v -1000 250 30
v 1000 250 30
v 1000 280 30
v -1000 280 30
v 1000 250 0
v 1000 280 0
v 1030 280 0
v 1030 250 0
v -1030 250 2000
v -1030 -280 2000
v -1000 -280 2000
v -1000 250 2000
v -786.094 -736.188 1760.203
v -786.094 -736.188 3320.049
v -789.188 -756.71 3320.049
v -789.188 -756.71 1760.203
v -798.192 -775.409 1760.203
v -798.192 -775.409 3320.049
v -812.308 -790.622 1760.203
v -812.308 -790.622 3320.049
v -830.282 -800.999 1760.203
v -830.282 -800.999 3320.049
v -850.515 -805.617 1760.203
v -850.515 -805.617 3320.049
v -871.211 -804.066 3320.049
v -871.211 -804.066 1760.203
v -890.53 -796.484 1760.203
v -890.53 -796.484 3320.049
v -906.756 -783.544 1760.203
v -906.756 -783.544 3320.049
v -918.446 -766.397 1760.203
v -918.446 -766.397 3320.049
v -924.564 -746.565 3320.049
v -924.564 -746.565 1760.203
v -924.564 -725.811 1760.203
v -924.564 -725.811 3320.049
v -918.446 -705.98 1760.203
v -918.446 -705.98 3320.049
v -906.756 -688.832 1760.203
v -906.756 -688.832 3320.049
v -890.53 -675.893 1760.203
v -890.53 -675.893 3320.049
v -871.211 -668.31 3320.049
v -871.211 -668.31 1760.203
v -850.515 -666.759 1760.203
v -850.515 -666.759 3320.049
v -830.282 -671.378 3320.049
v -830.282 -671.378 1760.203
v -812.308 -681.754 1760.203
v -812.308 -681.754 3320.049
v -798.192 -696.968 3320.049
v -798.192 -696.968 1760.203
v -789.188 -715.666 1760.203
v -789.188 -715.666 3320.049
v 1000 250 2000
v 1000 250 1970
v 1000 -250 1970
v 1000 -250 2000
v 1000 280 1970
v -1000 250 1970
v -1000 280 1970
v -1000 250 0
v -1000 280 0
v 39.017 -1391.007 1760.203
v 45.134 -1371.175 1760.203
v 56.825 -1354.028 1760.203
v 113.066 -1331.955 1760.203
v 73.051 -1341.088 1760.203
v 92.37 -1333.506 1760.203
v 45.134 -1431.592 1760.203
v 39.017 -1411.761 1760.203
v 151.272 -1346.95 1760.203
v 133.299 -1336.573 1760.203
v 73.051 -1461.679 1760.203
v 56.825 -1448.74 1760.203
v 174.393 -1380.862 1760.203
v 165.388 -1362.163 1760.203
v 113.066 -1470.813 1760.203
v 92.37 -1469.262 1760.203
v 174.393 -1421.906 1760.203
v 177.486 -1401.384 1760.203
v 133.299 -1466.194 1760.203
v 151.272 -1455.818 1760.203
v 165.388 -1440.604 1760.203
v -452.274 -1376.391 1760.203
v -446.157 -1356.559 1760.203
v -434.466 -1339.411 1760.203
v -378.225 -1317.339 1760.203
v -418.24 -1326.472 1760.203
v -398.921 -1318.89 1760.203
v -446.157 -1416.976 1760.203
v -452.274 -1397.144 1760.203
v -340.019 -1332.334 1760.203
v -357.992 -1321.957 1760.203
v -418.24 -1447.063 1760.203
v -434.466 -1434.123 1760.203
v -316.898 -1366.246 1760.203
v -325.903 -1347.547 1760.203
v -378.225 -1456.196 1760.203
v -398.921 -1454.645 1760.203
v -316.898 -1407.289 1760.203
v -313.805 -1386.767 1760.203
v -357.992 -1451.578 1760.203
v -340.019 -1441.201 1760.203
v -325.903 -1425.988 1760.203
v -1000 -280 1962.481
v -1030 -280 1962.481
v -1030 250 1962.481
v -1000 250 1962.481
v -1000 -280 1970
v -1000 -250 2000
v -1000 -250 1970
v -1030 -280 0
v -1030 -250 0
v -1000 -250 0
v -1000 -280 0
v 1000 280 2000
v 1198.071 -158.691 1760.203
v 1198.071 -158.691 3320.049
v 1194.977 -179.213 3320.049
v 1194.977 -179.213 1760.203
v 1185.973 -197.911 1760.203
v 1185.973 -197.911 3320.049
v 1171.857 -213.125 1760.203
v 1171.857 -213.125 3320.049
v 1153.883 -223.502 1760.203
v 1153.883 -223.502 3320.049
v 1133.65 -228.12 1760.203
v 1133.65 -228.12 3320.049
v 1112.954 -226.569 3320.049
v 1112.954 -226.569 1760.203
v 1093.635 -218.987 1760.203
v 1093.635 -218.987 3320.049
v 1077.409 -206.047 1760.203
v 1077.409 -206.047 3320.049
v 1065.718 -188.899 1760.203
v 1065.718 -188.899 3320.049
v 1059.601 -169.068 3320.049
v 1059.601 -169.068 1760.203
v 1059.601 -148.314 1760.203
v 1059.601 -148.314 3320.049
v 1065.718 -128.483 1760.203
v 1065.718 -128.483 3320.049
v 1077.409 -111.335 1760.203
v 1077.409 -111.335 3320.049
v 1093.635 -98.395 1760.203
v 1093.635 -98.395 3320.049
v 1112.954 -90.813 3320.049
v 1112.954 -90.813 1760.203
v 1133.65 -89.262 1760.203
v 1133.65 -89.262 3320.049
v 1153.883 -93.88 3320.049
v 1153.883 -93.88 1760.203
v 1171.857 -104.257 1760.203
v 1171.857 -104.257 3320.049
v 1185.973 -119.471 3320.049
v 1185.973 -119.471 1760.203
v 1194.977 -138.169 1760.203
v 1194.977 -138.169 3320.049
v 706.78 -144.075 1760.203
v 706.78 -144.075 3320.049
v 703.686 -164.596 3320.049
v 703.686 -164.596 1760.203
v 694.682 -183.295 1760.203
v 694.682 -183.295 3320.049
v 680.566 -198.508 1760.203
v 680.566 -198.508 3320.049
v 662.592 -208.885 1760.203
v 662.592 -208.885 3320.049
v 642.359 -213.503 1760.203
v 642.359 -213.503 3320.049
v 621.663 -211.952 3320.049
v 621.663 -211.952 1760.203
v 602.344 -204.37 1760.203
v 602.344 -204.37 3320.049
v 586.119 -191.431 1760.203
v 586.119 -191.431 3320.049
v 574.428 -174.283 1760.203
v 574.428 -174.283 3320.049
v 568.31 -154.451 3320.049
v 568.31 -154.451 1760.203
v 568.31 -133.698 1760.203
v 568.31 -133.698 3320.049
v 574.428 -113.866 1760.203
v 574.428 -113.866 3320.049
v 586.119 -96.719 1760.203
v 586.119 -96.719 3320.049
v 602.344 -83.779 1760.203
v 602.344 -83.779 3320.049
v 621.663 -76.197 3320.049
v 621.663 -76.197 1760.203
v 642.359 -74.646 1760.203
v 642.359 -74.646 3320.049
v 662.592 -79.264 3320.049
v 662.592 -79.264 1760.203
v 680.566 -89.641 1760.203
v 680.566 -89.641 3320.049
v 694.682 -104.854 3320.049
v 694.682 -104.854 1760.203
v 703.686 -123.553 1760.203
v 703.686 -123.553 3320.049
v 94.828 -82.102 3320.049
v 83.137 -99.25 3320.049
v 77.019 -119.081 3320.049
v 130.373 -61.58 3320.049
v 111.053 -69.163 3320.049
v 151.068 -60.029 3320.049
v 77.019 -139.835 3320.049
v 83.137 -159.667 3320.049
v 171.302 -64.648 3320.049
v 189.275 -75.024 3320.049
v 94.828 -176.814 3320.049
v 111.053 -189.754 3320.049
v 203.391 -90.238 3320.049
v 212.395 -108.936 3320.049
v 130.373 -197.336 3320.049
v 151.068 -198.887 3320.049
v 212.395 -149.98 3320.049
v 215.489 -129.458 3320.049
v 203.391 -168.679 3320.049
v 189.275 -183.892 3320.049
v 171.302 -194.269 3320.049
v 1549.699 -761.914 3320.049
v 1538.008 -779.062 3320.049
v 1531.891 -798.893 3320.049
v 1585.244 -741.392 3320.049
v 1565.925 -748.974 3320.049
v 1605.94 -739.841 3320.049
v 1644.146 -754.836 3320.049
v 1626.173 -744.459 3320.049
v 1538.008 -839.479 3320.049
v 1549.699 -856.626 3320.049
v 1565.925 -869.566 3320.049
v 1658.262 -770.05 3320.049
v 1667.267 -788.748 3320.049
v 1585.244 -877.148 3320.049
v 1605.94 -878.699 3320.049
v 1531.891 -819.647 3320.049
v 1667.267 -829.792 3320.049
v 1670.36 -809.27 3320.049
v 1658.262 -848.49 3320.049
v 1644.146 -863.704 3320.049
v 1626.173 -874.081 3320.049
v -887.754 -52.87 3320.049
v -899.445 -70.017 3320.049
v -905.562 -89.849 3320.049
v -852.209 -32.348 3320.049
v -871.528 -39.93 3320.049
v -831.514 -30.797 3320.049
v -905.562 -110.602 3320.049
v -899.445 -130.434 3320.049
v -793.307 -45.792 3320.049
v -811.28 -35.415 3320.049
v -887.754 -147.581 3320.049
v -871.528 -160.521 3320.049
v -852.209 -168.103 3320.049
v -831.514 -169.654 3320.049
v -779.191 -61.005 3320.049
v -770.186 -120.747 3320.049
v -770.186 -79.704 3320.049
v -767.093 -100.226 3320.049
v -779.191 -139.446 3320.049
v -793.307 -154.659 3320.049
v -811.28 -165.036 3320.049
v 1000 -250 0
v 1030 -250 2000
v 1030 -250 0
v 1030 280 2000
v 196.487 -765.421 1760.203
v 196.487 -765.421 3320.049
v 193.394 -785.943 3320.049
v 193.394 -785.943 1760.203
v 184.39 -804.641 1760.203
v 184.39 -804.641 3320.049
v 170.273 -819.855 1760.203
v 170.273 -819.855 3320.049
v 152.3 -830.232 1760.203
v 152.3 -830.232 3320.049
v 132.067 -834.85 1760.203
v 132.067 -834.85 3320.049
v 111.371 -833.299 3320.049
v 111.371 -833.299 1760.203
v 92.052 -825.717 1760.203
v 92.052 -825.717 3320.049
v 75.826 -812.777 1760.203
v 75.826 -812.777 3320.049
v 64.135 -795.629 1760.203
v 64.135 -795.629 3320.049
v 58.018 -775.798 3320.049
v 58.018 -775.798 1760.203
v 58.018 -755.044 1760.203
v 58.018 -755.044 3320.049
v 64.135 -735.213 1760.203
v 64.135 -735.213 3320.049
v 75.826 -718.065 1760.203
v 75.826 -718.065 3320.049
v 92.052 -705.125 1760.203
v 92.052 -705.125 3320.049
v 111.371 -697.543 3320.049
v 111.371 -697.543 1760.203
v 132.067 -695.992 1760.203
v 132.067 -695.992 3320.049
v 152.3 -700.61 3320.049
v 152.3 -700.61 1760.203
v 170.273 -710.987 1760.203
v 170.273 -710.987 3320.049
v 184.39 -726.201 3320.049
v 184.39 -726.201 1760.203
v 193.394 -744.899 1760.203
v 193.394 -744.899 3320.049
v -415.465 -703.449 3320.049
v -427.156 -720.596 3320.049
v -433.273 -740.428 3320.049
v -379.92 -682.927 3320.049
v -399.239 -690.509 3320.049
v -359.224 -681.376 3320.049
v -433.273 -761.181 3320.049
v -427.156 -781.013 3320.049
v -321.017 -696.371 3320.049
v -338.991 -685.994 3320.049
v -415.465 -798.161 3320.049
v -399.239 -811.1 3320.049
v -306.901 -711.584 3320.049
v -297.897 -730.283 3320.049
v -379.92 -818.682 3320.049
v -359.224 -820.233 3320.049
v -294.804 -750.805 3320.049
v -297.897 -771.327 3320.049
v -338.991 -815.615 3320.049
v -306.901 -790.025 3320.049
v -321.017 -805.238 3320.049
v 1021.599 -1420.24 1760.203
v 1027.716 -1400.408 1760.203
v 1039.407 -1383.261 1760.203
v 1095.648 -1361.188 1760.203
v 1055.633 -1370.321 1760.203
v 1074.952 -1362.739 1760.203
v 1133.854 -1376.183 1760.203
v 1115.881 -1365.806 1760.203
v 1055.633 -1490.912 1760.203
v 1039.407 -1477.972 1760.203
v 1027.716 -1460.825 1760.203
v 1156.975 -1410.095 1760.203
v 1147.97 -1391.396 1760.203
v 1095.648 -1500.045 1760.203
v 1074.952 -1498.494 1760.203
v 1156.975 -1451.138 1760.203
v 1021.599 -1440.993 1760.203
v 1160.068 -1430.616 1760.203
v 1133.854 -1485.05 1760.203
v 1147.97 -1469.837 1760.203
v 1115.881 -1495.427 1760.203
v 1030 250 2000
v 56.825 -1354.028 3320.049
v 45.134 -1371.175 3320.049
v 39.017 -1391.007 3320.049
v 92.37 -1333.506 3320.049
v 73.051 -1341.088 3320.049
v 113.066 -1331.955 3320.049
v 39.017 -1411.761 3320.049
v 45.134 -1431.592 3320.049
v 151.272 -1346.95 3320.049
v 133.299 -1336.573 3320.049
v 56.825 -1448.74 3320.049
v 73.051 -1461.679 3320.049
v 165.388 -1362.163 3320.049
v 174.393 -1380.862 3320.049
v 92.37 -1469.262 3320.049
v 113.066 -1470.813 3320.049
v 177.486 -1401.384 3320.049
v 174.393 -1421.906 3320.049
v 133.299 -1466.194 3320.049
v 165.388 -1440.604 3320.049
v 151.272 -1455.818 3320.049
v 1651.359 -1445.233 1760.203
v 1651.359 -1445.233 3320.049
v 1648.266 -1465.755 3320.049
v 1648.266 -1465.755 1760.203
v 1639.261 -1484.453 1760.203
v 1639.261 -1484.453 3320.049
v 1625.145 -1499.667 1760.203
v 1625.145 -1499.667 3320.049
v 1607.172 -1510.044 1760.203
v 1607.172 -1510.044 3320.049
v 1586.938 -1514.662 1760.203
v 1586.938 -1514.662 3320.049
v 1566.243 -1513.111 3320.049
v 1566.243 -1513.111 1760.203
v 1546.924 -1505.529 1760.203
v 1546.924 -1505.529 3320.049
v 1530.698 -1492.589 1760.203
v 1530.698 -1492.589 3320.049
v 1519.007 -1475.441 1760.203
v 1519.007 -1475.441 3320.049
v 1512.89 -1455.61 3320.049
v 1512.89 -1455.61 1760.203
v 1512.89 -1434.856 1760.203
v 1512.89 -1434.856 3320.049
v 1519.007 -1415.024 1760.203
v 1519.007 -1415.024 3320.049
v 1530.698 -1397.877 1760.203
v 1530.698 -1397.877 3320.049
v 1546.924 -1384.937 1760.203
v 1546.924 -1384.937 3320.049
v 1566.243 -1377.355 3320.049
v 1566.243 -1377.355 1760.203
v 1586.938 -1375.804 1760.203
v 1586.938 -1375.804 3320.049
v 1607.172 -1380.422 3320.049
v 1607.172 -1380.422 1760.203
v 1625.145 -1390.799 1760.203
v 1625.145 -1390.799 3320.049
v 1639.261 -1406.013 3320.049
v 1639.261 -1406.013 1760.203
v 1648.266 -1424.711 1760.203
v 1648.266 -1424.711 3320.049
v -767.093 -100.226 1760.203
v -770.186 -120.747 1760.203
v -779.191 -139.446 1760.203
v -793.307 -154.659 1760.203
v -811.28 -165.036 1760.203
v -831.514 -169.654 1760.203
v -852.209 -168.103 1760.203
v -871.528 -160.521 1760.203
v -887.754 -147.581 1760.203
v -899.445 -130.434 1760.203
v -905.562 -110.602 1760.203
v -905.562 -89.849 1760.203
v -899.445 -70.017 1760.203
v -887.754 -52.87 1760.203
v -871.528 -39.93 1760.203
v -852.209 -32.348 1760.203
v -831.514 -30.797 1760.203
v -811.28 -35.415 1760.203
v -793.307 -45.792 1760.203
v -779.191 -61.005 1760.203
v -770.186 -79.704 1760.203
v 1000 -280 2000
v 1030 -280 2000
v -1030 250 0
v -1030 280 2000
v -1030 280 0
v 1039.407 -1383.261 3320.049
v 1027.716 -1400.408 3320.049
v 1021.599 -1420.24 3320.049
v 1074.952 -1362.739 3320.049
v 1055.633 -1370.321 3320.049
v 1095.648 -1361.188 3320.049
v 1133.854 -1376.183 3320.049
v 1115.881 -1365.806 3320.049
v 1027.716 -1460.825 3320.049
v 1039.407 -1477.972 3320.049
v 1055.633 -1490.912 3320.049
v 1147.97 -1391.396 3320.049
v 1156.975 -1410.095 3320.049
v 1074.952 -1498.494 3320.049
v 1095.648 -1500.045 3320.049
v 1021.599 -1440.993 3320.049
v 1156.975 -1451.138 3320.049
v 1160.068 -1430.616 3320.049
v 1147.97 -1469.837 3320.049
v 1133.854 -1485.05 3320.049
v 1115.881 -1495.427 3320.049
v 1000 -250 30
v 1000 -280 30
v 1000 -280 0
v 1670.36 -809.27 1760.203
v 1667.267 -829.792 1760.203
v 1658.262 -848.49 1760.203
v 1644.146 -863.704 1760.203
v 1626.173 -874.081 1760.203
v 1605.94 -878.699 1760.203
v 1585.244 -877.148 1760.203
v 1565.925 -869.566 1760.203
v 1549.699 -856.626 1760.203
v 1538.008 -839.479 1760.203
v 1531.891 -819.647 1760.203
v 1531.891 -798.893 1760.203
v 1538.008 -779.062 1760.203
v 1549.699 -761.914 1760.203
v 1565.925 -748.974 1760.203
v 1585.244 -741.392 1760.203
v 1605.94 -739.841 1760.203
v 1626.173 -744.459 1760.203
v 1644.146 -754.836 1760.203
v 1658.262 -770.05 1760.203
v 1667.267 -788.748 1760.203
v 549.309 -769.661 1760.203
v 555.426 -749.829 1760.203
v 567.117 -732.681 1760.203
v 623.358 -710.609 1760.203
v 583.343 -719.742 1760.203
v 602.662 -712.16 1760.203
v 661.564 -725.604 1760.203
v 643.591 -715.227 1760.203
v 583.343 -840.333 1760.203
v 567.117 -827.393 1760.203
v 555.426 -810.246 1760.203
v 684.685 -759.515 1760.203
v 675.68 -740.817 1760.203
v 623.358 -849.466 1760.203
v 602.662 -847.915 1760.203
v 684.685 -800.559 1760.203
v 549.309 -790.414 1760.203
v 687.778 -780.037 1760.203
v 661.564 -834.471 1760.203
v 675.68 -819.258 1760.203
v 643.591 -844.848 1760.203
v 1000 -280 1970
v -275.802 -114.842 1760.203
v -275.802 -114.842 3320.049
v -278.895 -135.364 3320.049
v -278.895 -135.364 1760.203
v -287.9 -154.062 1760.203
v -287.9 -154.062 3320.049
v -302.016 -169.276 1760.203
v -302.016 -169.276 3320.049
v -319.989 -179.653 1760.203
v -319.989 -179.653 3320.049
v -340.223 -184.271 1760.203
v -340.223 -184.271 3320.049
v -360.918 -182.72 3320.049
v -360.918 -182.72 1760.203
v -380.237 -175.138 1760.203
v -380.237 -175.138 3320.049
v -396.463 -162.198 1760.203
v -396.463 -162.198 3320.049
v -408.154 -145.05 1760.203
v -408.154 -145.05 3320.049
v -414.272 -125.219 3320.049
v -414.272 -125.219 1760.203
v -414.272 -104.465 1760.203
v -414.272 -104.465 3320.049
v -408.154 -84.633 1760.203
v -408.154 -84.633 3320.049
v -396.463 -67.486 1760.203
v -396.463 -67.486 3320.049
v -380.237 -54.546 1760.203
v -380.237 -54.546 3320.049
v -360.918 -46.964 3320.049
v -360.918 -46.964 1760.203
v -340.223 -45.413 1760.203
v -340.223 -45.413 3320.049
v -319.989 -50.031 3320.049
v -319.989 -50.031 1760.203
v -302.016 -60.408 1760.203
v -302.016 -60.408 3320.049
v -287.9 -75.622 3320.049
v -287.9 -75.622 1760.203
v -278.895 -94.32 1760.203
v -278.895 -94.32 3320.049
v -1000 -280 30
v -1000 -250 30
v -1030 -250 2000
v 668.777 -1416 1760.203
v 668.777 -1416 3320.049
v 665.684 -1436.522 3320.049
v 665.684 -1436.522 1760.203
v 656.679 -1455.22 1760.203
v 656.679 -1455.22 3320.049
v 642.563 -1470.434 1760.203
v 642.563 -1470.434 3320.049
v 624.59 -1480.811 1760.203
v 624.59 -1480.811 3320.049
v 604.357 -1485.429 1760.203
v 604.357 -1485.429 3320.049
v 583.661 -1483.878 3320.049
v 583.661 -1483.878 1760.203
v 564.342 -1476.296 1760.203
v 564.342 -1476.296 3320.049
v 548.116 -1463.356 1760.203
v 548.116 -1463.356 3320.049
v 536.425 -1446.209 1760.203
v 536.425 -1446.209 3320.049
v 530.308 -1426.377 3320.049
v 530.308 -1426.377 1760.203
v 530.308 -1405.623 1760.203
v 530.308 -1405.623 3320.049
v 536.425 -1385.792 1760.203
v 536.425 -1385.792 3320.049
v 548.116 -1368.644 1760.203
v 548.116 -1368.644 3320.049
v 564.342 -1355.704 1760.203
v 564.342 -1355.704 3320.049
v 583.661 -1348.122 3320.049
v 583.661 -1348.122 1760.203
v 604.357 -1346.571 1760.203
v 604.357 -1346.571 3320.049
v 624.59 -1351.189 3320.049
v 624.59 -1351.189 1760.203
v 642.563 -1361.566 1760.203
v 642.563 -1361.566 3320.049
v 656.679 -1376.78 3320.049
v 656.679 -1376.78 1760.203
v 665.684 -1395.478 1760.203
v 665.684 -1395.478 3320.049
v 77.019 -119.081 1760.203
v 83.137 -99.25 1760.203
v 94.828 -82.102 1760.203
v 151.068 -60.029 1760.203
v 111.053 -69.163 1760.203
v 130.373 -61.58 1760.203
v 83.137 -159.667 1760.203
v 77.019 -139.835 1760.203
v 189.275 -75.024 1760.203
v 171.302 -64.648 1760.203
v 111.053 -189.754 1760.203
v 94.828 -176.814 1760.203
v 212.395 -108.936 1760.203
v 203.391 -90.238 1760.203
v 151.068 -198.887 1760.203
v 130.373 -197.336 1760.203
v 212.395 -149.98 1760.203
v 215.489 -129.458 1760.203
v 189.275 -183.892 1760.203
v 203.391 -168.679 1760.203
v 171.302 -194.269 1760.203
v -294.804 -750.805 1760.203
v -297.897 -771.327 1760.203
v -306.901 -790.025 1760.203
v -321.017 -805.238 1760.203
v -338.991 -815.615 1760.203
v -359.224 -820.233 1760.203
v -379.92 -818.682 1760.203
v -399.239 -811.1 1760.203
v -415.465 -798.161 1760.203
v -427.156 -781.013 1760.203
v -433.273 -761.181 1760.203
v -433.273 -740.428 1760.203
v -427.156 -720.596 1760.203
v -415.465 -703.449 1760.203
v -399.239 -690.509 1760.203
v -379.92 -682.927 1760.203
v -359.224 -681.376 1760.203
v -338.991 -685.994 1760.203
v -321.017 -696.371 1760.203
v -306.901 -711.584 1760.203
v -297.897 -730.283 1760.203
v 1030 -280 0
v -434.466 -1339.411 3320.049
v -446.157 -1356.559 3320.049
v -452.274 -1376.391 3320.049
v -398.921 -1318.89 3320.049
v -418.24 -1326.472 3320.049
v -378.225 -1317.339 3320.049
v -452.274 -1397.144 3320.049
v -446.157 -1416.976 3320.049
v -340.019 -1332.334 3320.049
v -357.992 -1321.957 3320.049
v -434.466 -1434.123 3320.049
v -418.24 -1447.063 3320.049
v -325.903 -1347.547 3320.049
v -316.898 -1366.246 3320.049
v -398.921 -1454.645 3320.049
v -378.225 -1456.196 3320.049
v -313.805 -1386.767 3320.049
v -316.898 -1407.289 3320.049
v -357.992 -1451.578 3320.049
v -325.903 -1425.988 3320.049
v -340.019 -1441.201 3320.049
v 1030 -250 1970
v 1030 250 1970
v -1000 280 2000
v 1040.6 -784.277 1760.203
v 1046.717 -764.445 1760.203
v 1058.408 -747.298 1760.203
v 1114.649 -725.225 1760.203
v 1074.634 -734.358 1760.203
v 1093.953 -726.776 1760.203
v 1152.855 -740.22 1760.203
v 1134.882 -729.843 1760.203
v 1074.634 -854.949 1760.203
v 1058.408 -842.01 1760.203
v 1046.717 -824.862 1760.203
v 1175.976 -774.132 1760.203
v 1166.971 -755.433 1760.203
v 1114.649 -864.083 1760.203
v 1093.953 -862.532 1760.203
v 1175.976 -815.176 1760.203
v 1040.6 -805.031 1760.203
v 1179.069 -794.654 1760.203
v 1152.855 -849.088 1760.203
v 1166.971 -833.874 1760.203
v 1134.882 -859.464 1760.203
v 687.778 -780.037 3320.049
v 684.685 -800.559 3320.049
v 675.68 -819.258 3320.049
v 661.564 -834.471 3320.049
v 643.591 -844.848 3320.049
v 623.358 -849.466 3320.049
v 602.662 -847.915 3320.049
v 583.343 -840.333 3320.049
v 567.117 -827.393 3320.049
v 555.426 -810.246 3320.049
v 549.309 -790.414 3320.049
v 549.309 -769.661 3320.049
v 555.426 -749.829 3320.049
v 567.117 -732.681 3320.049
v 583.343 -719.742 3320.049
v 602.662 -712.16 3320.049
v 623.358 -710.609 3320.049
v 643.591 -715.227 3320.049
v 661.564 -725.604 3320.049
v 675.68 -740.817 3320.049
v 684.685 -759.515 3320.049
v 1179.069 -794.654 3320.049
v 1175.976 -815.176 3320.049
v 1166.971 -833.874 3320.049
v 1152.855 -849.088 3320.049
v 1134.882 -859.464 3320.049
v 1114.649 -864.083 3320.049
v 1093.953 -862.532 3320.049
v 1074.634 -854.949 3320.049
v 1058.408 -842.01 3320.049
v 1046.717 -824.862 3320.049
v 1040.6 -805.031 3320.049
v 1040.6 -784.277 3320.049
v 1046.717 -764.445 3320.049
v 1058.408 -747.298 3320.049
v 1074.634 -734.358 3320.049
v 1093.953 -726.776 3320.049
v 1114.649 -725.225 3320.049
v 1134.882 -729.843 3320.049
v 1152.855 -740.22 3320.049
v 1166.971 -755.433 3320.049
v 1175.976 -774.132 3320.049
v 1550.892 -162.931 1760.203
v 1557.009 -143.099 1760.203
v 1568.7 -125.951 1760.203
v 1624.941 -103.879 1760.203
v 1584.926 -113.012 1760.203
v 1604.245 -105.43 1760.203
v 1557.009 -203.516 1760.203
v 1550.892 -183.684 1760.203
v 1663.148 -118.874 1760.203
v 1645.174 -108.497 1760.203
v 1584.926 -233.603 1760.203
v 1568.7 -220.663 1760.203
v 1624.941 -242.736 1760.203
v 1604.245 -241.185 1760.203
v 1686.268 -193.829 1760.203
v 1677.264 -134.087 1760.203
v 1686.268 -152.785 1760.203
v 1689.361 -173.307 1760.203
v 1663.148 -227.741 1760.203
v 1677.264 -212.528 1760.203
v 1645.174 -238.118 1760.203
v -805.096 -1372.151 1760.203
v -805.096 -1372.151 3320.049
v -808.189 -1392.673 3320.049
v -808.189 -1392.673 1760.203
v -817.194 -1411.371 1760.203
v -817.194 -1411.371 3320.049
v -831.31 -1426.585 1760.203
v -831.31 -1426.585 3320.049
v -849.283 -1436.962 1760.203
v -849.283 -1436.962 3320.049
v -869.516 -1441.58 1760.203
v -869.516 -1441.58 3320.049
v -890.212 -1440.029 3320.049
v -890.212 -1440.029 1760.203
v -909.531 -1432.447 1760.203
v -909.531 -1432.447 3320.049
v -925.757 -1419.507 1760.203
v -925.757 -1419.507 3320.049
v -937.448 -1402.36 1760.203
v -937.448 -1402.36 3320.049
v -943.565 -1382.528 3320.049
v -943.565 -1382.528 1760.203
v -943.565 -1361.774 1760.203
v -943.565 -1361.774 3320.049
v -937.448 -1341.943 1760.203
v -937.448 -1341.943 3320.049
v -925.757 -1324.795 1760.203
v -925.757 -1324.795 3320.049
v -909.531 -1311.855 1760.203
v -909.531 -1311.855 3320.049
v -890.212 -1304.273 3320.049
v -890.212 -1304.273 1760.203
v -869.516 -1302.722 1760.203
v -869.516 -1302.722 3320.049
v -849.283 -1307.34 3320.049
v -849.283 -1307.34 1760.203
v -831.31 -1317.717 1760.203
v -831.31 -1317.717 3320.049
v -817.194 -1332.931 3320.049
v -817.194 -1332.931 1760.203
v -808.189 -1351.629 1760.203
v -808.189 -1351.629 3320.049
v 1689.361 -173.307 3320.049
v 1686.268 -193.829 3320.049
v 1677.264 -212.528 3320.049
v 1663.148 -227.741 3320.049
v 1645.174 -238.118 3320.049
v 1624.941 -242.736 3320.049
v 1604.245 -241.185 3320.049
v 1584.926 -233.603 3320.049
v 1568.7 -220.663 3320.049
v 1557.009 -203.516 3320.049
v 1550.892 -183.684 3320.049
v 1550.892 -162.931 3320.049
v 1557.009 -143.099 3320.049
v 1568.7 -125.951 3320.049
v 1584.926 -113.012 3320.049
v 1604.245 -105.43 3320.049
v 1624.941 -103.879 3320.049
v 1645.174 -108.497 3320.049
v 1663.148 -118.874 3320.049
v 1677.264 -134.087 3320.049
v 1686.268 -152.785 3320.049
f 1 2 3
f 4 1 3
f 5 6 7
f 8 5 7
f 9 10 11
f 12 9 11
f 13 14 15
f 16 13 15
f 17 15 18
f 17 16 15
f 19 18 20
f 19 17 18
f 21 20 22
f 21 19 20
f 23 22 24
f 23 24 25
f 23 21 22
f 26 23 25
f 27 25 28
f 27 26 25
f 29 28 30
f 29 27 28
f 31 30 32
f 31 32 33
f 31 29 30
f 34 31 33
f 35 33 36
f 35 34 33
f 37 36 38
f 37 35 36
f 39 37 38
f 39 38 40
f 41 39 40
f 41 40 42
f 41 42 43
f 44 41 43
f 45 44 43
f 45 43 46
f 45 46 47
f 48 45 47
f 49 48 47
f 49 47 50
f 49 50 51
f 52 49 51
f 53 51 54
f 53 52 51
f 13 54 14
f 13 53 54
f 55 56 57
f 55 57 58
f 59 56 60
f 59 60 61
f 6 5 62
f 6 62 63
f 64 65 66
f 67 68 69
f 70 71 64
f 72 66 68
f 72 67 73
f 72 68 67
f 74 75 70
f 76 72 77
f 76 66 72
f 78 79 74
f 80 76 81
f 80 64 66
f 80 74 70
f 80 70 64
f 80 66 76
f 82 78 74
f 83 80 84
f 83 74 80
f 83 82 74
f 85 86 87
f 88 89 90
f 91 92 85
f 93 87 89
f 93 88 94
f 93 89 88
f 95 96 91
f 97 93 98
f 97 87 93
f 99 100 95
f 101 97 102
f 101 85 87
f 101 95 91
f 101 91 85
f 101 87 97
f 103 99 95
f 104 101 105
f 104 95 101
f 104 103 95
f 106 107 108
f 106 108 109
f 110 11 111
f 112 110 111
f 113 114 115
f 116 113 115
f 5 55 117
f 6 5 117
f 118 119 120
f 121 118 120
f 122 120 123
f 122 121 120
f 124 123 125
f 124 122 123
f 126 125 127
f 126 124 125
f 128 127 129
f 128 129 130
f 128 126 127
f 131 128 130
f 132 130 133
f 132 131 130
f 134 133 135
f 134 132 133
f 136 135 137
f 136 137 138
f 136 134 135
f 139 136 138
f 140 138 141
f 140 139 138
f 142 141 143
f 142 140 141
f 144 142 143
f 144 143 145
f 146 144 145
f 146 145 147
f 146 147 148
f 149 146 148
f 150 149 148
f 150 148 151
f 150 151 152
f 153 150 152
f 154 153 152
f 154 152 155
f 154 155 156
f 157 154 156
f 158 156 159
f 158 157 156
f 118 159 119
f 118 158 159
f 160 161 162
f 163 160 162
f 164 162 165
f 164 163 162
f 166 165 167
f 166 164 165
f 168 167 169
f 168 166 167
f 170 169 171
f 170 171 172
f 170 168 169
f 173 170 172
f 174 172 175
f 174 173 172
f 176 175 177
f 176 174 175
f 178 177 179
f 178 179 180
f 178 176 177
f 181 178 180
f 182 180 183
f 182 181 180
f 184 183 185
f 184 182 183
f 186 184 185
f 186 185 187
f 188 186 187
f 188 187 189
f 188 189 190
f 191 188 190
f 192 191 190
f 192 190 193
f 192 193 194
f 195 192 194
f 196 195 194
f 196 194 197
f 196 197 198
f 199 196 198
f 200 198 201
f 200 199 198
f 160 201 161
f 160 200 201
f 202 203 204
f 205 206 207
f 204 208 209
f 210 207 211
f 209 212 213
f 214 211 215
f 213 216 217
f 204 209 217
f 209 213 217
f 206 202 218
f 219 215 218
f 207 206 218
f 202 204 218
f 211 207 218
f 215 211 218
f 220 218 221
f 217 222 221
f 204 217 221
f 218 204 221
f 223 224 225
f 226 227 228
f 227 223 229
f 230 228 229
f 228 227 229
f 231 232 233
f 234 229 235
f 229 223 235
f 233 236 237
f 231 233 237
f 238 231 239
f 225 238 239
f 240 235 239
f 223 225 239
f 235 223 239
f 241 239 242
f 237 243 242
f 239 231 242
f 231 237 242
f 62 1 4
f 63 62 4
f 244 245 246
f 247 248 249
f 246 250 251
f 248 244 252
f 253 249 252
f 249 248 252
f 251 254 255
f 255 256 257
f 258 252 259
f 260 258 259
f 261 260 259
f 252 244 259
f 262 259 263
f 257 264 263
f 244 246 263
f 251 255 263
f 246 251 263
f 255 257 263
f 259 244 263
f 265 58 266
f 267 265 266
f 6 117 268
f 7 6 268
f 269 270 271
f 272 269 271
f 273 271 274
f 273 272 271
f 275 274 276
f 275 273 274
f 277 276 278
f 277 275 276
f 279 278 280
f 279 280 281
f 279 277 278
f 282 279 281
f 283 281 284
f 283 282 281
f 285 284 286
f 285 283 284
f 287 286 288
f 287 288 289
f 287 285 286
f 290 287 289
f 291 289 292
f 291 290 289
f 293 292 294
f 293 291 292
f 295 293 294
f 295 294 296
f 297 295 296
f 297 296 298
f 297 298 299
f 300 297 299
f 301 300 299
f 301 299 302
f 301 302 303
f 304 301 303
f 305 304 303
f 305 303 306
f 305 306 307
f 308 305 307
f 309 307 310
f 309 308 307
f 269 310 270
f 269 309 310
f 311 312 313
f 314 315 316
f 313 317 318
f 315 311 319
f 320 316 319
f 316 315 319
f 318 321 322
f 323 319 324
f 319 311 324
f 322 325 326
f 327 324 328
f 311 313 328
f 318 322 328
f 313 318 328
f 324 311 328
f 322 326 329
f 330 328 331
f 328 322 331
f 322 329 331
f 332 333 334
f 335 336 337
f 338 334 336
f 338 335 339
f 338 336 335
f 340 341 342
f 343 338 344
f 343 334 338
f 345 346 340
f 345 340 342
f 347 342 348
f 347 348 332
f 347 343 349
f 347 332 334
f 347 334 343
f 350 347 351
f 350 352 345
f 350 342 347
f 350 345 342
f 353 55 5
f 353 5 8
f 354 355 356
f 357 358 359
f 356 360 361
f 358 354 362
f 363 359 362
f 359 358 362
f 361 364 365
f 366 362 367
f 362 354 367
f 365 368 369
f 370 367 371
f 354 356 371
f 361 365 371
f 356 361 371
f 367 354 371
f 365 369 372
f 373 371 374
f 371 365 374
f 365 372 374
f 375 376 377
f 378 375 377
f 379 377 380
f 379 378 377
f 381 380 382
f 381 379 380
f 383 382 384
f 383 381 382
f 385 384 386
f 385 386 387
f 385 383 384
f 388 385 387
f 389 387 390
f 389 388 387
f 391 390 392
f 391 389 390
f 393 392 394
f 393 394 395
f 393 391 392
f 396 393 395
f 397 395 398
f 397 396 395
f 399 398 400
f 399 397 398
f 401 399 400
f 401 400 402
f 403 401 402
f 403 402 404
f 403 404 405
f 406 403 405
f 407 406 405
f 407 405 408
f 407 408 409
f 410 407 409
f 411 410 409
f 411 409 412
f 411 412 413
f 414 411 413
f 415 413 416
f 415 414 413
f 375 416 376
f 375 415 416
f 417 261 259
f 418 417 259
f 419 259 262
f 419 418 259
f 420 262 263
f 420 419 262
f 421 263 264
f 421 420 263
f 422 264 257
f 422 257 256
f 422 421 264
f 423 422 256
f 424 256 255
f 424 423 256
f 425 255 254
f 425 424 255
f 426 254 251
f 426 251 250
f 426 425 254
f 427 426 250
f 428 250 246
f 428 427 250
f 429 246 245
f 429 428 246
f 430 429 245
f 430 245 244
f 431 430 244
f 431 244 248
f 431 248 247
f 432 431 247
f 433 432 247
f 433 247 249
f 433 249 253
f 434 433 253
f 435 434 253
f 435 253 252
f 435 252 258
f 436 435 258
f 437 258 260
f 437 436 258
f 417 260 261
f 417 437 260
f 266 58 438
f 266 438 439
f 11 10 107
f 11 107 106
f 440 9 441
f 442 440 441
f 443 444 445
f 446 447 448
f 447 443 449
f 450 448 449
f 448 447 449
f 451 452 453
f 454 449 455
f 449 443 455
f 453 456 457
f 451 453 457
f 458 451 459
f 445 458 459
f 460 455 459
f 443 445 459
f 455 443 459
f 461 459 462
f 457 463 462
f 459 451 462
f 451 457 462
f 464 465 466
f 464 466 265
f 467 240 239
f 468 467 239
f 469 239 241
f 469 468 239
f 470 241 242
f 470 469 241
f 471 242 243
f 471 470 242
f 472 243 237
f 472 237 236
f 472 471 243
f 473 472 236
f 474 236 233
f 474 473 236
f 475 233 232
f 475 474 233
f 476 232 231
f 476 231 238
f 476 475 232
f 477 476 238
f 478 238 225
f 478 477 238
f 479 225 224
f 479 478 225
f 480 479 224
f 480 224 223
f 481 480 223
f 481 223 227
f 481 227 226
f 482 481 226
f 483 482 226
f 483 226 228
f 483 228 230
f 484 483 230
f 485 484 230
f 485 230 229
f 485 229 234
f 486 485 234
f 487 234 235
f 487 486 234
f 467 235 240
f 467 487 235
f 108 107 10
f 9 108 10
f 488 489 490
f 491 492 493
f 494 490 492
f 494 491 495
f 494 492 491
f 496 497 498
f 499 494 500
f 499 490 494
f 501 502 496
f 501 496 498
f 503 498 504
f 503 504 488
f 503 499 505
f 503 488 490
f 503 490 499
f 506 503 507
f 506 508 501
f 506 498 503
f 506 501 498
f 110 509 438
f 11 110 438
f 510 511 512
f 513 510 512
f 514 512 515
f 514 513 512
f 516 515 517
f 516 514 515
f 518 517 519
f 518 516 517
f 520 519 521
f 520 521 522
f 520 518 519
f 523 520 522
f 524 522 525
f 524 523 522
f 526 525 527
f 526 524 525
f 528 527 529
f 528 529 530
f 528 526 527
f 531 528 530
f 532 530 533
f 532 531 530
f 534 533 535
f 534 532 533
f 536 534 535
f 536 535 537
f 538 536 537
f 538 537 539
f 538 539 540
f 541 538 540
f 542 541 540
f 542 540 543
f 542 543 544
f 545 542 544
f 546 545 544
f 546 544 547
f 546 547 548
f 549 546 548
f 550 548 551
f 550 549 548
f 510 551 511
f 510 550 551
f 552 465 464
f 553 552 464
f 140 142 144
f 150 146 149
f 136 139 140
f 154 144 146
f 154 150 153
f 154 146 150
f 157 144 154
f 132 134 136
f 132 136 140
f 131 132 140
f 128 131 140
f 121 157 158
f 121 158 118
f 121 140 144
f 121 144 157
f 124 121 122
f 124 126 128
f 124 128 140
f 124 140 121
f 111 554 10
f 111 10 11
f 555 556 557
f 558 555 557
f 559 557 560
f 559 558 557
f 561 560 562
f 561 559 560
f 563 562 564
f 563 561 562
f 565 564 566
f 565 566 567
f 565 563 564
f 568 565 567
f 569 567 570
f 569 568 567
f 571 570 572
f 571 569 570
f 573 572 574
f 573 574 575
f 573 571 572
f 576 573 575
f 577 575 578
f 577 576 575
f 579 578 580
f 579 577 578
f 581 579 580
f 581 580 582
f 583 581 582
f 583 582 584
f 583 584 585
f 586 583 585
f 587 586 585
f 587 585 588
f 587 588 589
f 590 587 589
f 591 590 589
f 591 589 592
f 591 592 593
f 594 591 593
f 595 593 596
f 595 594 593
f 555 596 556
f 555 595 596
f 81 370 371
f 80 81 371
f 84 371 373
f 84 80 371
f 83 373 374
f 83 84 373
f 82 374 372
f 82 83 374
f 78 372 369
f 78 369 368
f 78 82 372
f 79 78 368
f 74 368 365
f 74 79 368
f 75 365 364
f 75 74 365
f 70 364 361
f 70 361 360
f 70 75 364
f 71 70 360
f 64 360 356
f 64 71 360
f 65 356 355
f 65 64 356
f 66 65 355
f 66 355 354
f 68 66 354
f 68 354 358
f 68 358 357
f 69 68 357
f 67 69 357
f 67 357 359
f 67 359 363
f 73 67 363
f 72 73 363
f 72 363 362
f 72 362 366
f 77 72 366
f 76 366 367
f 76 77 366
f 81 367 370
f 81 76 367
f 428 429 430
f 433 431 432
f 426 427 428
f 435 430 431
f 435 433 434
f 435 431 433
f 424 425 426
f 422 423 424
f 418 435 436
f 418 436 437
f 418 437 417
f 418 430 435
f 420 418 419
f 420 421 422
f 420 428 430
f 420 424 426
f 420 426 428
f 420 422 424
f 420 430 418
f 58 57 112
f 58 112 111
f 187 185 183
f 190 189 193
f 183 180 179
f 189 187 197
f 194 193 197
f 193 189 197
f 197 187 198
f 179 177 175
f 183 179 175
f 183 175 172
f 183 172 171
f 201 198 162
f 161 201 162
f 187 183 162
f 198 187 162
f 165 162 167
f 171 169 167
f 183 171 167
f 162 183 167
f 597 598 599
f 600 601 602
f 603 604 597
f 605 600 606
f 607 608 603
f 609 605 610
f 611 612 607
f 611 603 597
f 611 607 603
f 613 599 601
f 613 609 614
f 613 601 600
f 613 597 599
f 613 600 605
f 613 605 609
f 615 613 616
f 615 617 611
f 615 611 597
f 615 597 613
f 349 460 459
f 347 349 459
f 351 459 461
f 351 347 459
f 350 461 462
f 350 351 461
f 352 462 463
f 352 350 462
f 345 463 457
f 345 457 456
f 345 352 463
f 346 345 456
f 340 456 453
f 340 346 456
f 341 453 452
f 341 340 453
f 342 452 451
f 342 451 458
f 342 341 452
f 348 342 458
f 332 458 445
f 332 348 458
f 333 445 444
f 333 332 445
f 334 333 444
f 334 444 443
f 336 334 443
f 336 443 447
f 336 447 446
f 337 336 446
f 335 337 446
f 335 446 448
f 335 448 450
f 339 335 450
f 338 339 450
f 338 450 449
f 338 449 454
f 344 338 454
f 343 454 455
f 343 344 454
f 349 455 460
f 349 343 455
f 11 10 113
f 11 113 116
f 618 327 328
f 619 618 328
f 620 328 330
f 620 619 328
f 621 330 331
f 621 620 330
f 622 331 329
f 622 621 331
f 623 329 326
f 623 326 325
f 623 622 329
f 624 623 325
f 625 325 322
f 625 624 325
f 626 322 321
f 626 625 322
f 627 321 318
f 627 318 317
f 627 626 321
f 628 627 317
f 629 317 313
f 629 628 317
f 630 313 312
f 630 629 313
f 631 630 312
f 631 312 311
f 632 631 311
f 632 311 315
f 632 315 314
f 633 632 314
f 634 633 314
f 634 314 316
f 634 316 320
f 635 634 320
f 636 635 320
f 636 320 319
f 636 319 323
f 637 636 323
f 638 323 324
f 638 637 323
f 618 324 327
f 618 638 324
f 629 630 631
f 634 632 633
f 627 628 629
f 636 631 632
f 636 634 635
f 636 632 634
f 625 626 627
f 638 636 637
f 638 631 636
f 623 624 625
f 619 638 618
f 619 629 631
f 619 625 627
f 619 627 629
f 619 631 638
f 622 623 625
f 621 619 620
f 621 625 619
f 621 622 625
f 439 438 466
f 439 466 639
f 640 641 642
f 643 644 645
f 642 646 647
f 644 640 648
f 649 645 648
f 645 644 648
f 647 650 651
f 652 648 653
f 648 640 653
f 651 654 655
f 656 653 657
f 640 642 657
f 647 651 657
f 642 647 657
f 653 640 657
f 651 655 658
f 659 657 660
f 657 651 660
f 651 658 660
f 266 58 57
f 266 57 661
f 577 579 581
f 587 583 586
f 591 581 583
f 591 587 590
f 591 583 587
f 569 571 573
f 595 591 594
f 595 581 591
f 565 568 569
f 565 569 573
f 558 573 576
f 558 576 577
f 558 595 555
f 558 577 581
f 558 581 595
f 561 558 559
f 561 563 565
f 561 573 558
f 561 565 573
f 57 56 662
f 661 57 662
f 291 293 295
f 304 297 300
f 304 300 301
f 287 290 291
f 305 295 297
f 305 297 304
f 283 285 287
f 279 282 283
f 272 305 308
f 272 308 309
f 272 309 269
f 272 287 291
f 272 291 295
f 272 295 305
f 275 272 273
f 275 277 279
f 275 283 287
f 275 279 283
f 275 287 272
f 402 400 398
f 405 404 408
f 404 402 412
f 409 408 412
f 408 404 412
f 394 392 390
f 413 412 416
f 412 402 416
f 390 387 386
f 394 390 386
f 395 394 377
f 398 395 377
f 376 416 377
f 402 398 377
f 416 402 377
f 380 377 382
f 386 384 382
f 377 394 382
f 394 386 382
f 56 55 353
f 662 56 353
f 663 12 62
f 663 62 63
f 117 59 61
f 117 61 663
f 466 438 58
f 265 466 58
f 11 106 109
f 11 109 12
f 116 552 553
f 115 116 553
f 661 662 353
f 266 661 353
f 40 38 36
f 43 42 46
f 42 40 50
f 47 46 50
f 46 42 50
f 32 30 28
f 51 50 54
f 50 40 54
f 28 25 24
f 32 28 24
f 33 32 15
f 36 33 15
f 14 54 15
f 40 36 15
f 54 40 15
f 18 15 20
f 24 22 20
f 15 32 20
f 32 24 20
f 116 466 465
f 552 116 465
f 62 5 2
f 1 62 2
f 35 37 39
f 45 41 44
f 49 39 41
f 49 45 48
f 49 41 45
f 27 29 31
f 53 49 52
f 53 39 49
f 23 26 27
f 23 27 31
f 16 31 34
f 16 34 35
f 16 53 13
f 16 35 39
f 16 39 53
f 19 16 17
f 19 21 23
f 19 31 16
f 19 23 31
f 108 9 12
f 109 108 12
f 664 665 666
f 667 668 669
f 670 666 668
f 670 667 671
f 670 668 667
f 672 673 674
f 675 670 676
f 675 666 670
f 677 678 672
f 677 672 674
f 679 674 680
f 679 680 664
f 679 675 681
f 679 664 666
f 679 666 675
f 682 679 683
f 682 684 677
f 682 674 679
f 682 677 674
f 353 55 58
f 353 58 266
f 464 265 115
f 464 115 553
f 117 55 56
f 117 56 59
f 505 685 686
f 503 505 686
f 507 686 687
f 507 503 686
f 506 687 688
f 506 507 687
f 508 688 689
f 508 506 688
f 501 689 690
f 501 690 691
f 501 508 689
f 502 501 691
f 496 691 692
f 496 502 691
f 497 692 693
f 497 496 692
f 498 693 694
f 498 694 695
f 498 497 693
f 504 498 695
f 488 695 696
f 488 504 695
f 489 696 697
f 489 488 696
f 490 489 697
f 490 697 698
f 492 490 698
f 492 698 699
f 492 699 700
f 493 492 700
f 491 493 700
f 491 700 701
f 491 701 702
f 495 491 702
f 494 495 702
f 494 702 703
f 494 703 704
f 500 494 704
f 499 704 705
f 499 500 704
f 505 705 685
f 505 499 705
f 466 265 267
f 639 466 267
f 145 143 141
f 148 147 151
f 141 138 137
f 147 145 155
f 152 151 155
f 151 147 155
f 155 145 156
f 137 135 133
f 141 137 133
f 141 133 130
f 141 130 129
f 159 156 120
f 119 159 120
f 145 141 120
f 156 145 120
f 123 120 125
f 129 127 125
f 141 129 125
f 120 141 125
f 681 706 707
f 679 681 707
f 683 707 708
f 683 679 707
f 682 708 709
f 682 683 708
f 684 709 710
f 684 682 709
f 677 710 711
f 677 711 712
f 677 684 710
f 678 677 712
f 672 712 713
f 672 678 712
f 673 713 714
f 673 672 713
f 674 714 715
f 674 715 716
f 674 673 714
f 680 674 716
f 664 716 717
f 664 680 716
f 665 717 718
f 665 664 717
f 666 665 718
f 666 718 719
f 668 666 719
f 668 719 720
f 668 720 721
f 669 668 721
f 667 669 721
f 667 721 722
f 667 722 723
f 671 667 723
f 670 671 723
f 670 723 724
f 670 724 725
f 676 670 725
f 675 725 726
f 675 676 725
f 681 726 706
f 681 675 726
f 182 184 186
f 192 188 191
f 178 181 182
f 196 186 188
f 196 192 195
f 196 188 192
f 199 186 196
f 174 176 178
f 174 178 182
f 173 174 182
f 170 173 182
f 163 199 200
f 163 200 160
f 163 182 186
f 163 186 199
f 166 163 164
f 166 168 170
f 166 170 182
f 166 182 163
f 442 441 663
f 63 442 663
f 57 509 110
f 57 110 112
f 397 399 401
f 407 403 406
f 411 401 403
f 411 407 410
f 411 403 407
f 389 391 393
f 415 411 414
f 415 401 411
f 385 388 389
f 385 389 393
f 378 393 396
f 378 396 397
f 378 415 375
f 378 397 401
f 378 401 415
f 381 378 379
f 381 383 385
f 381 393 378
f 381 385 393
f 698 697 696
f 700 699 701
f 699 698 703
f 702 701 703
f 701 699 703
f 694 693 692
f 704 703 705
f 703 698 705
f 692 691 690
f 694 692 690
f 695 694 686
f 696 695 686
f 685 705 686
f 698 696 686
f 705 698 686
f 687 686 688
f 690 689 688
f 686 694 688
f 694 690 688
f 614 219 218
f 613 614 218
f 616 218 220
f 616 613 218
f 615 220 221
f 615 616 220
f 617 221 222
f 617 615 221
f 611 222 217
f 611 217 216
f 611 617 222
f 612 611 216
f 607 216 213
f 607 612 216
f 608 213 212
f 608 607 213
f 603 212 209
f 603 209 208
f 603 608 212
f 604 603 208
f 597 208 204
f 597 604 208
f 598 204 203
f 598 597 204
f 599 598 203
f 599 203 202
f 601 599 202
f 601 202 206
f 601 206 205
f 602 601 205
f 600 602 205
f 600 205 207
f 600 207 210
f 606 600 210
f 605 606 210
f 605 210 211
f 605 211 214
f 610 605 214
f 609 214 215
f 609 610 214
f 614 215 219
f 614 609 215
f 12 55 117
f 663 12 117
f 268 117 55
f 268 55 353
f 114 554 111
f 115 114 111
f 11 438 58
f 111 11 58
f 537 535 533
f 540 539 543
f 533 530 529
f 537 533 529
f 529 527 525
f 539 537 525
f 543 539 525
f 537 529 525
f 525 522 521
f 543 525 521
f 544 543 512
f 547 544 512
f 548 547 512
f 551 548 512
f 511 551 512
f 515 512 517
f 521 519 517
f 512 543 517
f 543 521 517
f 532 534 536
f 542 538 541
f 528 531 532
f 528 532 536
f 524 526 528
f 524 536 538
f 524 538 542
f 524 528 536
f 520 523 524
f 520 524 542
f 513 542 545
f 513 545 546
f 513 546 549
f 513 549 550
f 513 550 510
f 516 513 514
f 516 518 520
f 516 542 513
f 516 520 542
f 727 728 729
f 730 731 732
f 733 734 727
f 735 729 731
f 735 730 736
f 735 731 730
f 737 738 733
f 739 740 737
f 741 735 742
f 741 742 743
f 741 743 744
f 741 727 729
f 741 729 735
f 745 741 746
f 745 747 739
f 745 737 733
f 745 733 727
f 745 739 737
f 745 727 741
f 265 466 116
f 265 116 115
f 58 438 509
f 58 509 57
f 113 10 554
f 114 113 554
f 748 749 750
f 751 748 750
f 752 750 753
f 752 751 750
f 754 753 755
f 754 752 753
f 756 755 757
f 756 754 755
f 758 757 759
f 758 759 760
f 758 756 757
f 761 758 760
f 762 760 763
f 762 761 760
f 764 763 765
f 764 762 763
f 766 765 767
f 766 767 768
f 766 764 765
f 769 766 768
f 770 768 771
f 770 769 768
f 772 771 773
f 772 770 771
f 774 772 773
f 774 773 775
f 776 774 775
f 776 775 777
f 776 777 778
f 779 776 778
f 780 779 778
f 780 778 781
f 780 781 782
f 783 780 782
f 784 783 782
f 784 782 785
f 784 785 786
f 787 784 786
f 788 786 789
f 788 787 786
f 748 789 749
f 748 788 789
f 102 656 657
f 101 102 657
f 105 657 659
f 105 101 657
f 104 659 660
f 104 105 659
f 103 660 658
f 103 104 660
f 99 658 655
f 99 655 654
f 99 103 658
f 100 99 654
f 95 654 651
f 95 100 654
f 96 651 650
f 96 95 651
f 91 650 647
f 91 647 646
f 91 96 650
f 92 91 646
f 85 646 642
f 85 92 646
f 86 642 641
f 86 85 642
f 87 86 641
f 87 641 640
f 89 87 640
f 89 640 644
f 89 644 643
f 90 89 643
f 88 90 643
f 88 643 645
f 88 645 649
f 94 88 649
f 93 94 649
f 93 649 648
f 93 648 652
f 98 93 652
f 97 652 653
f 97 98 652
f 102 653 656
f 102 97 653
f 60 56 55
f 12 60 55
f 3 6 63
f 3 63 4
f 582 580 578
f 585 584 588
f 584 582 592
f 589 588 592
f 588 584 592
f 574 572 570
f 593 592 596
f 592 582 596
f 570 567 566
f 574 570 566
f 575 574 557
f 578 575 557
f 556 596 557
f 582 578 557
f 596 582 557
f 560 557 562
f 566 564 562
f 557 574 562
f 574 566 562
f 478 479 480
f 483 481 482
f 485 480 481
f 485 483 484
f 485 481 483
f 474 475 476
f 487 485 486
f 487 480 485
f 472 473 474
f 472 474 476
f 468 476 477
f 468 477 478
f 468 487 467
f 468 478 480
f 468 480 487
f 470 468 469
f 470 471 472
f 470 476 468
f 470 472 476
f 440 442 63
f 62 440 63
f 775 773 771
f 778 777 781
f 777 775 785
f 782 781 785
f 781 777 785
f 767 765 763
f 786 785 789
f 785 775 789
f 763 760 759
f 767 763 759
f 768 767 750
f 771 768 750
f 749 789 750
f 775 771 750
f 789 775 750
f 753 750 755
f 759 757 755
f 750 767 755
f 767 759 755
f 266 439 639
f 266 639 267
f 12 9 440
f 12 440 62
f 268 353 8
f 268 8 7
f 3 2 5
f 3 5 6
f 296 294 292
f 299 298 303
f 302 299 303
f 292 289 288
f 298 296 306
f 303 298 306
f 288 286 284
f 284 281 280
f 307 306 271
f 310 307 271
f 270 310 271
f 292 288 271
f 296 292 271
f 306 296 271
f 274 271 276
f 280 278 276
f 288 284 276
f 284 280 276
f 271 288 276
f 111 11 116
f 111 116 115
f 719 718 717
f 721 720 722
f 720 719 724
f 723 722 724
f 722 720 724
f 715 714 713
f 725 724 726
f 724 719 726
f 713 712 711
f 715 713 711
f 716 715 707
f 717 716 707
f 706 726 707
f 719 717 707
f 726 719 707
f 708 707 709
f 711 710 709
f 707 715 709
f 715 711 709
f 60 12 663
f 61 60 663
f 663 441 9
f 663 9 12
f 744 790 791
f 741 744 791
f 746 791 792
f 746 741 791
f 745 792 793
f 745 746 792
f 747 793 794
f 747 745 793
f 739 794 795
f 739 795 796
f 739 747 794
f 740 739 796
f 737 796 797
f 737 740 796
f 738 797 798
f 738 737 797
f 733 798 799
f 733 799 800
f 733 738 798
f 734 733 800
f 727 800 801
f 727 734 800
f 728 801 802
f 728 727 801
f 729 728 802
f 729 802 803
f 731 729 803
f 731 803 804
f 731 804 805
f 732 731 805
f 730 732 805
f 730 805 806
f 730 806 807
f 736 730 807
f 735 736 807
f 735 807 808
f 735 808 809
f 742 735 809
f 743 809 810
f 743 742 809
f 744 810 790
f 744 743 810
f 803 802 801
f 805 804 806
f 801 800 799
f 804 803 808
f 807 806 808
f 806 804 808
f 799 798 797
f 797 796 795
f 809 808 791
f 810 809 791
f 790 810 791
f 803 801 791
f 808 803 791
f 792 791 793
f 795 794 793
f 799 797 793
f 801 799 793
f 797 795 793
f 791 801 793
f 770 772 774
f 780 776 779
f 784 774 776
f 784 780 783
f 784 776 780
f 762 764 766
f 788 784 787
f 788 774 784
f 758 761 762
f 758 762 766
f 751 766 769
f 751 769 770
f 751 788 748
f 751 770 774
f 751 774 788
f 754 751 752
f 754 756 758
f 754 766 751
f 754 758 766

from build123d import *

# Parameters (mm, degrees)
F0_W      = 30
F0_H      = 30
F1_DEPTH  = 2000
F2_W      = 30
F2_H      = 30
F3_DEPTH  = 2000
F4_W      = 30
F4_H      = 30
F5_DEPTH  = 2000
F6_W      = 30
F6_H      = 37.5192165375
F7_DEPTH  = 530
F8_W      = 30
F8_H      = 30
F9_DEPTH  = 500
F12_R     = 69.6234629817
F13_DEPTH = 1559.8455667496


with BuildPart() as f1:
    # F0 (on Top) → F1 (new body)
    with BuildSketch(Plane.XY):
        with Locations((-1015, 265)):
            Rectangle(F0_W, F0_H)
    extrude(amount=F1_DEPTH)


with BuildPart() as f1b:
    # F0 (on Top) → F1, piece 2 (new body)
    with BuildSketch(Plane.XY):
        with Locations((1015, 265)):
            Rectangle(F0_W, F0_H)
    extrude(amount=F1_DEPTH)


with BuildPart() as f1c:
    # F0 (on Top) → F1, piece 3 (new body)
    with BuildSketch(Plane.XY):
        with Locations((-1015, -265)):
            Rectangle(F0_W, F0_H)
    extrude(amount=F1_DEPTH)


with BuildPart() as f1d:
    # F0 (on Top) → F1, piece 4 (new body)
    with BuildSketch(Plane.XY):
        with Locations((1015, -265)):
            Rectangle(F0_W, F0_H)
    extrude(amount=F1_DEPTH)


with BuildPart() as f3:
    # F2 (on face) → F3 (new body, through all)
    with BuildSketch(Plane.YZ.offset(-1000)):
        with Locations((265, 15)):
            Rectangle(F2_W, F2_H)
    extrude(amount=F3_DEPTH)


with BuildPart() as f3b:
    # F2 (on face) → F3, piece 2 (new body, through all)
    with BuildSketch(Plane.YZ.offset(-1000)):
        with Locations((-265, 15)):
            Rectangle(F2_W, F2_H)
    extrude(amount=F3_DEPTH)


with BuildPart() as f5:
    # F4 (on face) → F5 (new body, through all)
    with BuildSketch(Plane.YZ.offset(-1000)):
        with Locations((-265, 1985)):
            Rectangle(F4_W, F4_H)
    extrude(amount=F5_DEPTH)


with BuildPart() as f5b:
    # F4 (on face) → F5, piece 2 (new body, through all)
    with BuildSketch(Plane.YZ.offset(-1000)):
        with Locations((265, 1985)):
            Rectangle(F4_W, F4_H)
    extrude(amount=F5_DEPTH)


with BuildPart() as f7:
    # F6 (on face) → F7 (new body, through all)
    with BuildSketch(Plane.XZ.offset(280)):
        with Locations((-1015, 1981.2403917313)):
            Rectangle(F6_W, F6_H)
    extrude(amount=-F7_DEPTH)


with BuildPart() as f9:
    # F8 (on face) → F9 (new body)
    with BuildSketch(Plane.XZ.offset(-250)):
        with Locations((1015, 1985)):
            Rectangle(F8_W, F8_H)
    extrude(amount=F9_DEPTH)


with BuildPart() as f13:
    # F12 (on face) → F13 (new body)
    with BuildSketch(Plane(origin=(0, 0, 1760.2030038834), x_dir=(1, 0, 0), z_dir=(0, 0, -1))):
        with Locations((-836.7166519165, 100.225508213)):
            Circle(F12_R)
    extrude(amount=-F13_DEPTH)


with BuildPart() as f13b:
    # F12 (on face) → F13, piece 2 (new body)
    with BuildSketch(Plane(origin=(0, 0, 1760.2030038834), x_dir=(1, 0, 0), z_dir=(0, 0, -1))):
        with Locations((-855.7178974152, 736.188262701)):
            Circle(F12_R)
    extrude(amount=-F13_DEPTH)


with BuildPart() as f13c:
    # F12 (on face) → F13, piece 3 (new body)
    with BuildSketch(Plane(origin=(0, 0, 1760.2030038834), x_dir=(1, 0, 0), z_dir=(0, 0, -1))):
        with Locations((-345.4257249832, 114.8418784142)):
            Circle(F12_R)
    extrude(amount=-F13_DEPTH)


with BuildPart() as f13d:
    # F12 (on face) → F13, piece 4 (new body)
    with BuildSketch(Plane(origin=(0, 0, 1760.2030038834), x_dir=(1, 0, 0), z_dir=(0, 0, -1))):
        with Locations((-364.4269704819, 750.8046329021)):
            Circle(F12_R)
    extrude(amount=-F13_DEPTH)


with BuildPart() as f13e:
    # F12 (on face) → F13, piece 5 (new body)
    with BuildSketch(Plane(origin=(0, 0, 1760.2030038834), x_dir=(1, 0, 0), z_dir=(0, 0, -1))):
        with Locations((145.8652019501, 129.4582486153)):
            Circle(F12_R)
    extrude(amount=-F13_DEPTH)


with BuildPart() as f13f:
    # F12 (on face) → F13, piece 6 (new body)
    with BuildSketch(Plane(origin=(0, 0, 1760.2030038834), x_dir=(1, 0, 0), z_dir=(0, 0, -1))):
        with Locations((126.8639564514, 765.4210031033)):
            Circle(F12_R)
    extrude(amount=-F13_DEPTH)


with BuildPart() as f13g:
    # F12 (on face) → F13, piece 7 (new body)
    with BuildSketch(Plane(origin=(0, 0, 1760.2030038834), x_dir=(1, 0, 0), z_dir=(0, 0, -1))):
        with Locations((-874.7191429138, 1372.151017189)):
            Circle(F12_R)
    extrude(amount=-F13_DEPTH)


with BuildPart() as f13h:
    # F12 (on face) → F13, piece 8 (new body)
    with BuildSketch(Plane(origin=(0, 0, 1760.2030038834), x_dir=(1, 0, 0), z_dir=(0, 0, -1))):
        with Locations((-383.4282159805, 1386.7673873901)):
            Circle(F12_R)
    extrude(amount=-F13_DEPTH)


with BuildPart() as f13i:
    # F12 (on face) → F13, piece 9 (new body)
    with BuildSketch(Plane(origin=(0, 0, 1760.2030038834), x_dir=(1, 0, 0), z_dir=(0, 0, -1))):
        with Locations((107.8627109528, 1401.3837575912)):
            Circle(F12_R)
    extrude(amount=-F13_DEPTH)


with BuildPart() as f13j:
    # F12 (on face) → F13, piece 10 (new body)
    with BuildSketch(Plane(origin=(0, 0, 1760.2030038834), x_dir=(1, 0, 0), z_dir=(0, 0, -1))):
        with Locations((637.1561288834, 144.0746188164)):
            Circle(F12_R)
    extrude(amount=-F13_DEPTH)


with BuildPart() as f13k:
    # F12 (on face) → F13, piece 11 (new body)
    with BuildSketch(Plane(origin=(0, 0, 1760.2030038834), x_dir=(1, 0, 0), z_dir=(0, 0, -1))):
        with Locations((618.1548833847, 780.0373733044)):
            Circle(F12_R)
    extrude(amount=-F13_DEPTH)


with BuildPart() as f13l:
    # F12 (on face) → F13, piece 12 (new body)
    with BuildSketch(Plane(origin=(0, 0, 1760.2030038834), x_dir=(1, 0, 0), z_dir=(0, 0, -1))):
        with Locations((599.153637886, 1416.0001277924)):
            Circle(F12_R)
    extrude(amount=-F13_DEPTH)


with BuildPart() as f13m:
    # F12 (on face) → F13, piece 13 (new body)
    with BuildSketch(Plane(origin=(0, 0, 1760.2030038834), x_dir=(1, 0, 0), z_dir=(0, 0, -1))):
        with Locations((1128.4470558167, 158.6909890175)):
            Circle(F12_R)
    extrude(amount=-F13_DEPTH)


with BuildPart() as f13n:
    # F12 (on face) → F13, piece 14 (new body)
    with BuildSketch(Plane(origin=(0, 0, 1760.2030038834), x_dir=(1, 0, 0), z_dir=(0, 0, -1))):
        with Locations((1109.445810318, 794.6537435055)):
            Circle(F12_R)
    extrude(amount=-F13_DEPTH)


with BuildPart() as f13o:
    # F12 (on face) → F13, piece 15 (new body)
    with BuildSketch(Plane(origin=(0, 0, 1760.2030038834), x_dir=(1, 0, 0), z_dir=(0, 0, -1))):
        with Locations((1090.4445648193, 1430.6164979935)):
            Circle(F12_R)
    extrude(amount=-F13_DEPTH)


with BuildPart() as f13p:
    # F12 (on face) → F13, piece 16 (new body)
    with BuildSketch(Plane(origin=(0, 0, 1760.2030038834), x_dir=(1, 0, 0), z_dir=(0, 0, -1))):
        with Locations((1619.7379827499, 173.3073592186)):
            Circle(F12_R)
    extrude(amount=-F13_DEPTH)


with BuildPart() as f13q:
    # F12 (on face) → F13, piece 17 (new body)
    with BuildSketch(Plane(origin=(0, 0, 1760.2030038834), x_dir=(1, 0, 0), z_dir=(0, 0, -1))):
        with Locations((1600.7367372513, 809.2701137066)):
            Circle(F12_R)
    extrude(amount=-F13_DEPTH)


with BuildPart() as f13r:
    # F12 (on face) → F13, piece 18 (new body)
    with BuildSketch(Plane(origin=(0, 0, 1760.2030038834), x_dir=(1, 0, 0), z_dir=(0, 0, -1))):
        with Locations((1581.7354917526, 1445.2328681946)):
            Circle(F12_R)
    extrude(amount=-F13_DEPTH)


solid = Compound([f1.part, f1b.part, f1c.part, f1d.part, f3.part, f3b.part, f5.part, f5b.part, f7.part, f9.part, f13.part, f13b.part, f13c.part, f13d.part, f13e.part, f13f.part, f13g.part, f13h.part, f13i.part, f13j.part, f13k.part, f13l.part, f13m.part, f13n.part, f13o.part, f13p.part, f13q.part, f13r.part])
